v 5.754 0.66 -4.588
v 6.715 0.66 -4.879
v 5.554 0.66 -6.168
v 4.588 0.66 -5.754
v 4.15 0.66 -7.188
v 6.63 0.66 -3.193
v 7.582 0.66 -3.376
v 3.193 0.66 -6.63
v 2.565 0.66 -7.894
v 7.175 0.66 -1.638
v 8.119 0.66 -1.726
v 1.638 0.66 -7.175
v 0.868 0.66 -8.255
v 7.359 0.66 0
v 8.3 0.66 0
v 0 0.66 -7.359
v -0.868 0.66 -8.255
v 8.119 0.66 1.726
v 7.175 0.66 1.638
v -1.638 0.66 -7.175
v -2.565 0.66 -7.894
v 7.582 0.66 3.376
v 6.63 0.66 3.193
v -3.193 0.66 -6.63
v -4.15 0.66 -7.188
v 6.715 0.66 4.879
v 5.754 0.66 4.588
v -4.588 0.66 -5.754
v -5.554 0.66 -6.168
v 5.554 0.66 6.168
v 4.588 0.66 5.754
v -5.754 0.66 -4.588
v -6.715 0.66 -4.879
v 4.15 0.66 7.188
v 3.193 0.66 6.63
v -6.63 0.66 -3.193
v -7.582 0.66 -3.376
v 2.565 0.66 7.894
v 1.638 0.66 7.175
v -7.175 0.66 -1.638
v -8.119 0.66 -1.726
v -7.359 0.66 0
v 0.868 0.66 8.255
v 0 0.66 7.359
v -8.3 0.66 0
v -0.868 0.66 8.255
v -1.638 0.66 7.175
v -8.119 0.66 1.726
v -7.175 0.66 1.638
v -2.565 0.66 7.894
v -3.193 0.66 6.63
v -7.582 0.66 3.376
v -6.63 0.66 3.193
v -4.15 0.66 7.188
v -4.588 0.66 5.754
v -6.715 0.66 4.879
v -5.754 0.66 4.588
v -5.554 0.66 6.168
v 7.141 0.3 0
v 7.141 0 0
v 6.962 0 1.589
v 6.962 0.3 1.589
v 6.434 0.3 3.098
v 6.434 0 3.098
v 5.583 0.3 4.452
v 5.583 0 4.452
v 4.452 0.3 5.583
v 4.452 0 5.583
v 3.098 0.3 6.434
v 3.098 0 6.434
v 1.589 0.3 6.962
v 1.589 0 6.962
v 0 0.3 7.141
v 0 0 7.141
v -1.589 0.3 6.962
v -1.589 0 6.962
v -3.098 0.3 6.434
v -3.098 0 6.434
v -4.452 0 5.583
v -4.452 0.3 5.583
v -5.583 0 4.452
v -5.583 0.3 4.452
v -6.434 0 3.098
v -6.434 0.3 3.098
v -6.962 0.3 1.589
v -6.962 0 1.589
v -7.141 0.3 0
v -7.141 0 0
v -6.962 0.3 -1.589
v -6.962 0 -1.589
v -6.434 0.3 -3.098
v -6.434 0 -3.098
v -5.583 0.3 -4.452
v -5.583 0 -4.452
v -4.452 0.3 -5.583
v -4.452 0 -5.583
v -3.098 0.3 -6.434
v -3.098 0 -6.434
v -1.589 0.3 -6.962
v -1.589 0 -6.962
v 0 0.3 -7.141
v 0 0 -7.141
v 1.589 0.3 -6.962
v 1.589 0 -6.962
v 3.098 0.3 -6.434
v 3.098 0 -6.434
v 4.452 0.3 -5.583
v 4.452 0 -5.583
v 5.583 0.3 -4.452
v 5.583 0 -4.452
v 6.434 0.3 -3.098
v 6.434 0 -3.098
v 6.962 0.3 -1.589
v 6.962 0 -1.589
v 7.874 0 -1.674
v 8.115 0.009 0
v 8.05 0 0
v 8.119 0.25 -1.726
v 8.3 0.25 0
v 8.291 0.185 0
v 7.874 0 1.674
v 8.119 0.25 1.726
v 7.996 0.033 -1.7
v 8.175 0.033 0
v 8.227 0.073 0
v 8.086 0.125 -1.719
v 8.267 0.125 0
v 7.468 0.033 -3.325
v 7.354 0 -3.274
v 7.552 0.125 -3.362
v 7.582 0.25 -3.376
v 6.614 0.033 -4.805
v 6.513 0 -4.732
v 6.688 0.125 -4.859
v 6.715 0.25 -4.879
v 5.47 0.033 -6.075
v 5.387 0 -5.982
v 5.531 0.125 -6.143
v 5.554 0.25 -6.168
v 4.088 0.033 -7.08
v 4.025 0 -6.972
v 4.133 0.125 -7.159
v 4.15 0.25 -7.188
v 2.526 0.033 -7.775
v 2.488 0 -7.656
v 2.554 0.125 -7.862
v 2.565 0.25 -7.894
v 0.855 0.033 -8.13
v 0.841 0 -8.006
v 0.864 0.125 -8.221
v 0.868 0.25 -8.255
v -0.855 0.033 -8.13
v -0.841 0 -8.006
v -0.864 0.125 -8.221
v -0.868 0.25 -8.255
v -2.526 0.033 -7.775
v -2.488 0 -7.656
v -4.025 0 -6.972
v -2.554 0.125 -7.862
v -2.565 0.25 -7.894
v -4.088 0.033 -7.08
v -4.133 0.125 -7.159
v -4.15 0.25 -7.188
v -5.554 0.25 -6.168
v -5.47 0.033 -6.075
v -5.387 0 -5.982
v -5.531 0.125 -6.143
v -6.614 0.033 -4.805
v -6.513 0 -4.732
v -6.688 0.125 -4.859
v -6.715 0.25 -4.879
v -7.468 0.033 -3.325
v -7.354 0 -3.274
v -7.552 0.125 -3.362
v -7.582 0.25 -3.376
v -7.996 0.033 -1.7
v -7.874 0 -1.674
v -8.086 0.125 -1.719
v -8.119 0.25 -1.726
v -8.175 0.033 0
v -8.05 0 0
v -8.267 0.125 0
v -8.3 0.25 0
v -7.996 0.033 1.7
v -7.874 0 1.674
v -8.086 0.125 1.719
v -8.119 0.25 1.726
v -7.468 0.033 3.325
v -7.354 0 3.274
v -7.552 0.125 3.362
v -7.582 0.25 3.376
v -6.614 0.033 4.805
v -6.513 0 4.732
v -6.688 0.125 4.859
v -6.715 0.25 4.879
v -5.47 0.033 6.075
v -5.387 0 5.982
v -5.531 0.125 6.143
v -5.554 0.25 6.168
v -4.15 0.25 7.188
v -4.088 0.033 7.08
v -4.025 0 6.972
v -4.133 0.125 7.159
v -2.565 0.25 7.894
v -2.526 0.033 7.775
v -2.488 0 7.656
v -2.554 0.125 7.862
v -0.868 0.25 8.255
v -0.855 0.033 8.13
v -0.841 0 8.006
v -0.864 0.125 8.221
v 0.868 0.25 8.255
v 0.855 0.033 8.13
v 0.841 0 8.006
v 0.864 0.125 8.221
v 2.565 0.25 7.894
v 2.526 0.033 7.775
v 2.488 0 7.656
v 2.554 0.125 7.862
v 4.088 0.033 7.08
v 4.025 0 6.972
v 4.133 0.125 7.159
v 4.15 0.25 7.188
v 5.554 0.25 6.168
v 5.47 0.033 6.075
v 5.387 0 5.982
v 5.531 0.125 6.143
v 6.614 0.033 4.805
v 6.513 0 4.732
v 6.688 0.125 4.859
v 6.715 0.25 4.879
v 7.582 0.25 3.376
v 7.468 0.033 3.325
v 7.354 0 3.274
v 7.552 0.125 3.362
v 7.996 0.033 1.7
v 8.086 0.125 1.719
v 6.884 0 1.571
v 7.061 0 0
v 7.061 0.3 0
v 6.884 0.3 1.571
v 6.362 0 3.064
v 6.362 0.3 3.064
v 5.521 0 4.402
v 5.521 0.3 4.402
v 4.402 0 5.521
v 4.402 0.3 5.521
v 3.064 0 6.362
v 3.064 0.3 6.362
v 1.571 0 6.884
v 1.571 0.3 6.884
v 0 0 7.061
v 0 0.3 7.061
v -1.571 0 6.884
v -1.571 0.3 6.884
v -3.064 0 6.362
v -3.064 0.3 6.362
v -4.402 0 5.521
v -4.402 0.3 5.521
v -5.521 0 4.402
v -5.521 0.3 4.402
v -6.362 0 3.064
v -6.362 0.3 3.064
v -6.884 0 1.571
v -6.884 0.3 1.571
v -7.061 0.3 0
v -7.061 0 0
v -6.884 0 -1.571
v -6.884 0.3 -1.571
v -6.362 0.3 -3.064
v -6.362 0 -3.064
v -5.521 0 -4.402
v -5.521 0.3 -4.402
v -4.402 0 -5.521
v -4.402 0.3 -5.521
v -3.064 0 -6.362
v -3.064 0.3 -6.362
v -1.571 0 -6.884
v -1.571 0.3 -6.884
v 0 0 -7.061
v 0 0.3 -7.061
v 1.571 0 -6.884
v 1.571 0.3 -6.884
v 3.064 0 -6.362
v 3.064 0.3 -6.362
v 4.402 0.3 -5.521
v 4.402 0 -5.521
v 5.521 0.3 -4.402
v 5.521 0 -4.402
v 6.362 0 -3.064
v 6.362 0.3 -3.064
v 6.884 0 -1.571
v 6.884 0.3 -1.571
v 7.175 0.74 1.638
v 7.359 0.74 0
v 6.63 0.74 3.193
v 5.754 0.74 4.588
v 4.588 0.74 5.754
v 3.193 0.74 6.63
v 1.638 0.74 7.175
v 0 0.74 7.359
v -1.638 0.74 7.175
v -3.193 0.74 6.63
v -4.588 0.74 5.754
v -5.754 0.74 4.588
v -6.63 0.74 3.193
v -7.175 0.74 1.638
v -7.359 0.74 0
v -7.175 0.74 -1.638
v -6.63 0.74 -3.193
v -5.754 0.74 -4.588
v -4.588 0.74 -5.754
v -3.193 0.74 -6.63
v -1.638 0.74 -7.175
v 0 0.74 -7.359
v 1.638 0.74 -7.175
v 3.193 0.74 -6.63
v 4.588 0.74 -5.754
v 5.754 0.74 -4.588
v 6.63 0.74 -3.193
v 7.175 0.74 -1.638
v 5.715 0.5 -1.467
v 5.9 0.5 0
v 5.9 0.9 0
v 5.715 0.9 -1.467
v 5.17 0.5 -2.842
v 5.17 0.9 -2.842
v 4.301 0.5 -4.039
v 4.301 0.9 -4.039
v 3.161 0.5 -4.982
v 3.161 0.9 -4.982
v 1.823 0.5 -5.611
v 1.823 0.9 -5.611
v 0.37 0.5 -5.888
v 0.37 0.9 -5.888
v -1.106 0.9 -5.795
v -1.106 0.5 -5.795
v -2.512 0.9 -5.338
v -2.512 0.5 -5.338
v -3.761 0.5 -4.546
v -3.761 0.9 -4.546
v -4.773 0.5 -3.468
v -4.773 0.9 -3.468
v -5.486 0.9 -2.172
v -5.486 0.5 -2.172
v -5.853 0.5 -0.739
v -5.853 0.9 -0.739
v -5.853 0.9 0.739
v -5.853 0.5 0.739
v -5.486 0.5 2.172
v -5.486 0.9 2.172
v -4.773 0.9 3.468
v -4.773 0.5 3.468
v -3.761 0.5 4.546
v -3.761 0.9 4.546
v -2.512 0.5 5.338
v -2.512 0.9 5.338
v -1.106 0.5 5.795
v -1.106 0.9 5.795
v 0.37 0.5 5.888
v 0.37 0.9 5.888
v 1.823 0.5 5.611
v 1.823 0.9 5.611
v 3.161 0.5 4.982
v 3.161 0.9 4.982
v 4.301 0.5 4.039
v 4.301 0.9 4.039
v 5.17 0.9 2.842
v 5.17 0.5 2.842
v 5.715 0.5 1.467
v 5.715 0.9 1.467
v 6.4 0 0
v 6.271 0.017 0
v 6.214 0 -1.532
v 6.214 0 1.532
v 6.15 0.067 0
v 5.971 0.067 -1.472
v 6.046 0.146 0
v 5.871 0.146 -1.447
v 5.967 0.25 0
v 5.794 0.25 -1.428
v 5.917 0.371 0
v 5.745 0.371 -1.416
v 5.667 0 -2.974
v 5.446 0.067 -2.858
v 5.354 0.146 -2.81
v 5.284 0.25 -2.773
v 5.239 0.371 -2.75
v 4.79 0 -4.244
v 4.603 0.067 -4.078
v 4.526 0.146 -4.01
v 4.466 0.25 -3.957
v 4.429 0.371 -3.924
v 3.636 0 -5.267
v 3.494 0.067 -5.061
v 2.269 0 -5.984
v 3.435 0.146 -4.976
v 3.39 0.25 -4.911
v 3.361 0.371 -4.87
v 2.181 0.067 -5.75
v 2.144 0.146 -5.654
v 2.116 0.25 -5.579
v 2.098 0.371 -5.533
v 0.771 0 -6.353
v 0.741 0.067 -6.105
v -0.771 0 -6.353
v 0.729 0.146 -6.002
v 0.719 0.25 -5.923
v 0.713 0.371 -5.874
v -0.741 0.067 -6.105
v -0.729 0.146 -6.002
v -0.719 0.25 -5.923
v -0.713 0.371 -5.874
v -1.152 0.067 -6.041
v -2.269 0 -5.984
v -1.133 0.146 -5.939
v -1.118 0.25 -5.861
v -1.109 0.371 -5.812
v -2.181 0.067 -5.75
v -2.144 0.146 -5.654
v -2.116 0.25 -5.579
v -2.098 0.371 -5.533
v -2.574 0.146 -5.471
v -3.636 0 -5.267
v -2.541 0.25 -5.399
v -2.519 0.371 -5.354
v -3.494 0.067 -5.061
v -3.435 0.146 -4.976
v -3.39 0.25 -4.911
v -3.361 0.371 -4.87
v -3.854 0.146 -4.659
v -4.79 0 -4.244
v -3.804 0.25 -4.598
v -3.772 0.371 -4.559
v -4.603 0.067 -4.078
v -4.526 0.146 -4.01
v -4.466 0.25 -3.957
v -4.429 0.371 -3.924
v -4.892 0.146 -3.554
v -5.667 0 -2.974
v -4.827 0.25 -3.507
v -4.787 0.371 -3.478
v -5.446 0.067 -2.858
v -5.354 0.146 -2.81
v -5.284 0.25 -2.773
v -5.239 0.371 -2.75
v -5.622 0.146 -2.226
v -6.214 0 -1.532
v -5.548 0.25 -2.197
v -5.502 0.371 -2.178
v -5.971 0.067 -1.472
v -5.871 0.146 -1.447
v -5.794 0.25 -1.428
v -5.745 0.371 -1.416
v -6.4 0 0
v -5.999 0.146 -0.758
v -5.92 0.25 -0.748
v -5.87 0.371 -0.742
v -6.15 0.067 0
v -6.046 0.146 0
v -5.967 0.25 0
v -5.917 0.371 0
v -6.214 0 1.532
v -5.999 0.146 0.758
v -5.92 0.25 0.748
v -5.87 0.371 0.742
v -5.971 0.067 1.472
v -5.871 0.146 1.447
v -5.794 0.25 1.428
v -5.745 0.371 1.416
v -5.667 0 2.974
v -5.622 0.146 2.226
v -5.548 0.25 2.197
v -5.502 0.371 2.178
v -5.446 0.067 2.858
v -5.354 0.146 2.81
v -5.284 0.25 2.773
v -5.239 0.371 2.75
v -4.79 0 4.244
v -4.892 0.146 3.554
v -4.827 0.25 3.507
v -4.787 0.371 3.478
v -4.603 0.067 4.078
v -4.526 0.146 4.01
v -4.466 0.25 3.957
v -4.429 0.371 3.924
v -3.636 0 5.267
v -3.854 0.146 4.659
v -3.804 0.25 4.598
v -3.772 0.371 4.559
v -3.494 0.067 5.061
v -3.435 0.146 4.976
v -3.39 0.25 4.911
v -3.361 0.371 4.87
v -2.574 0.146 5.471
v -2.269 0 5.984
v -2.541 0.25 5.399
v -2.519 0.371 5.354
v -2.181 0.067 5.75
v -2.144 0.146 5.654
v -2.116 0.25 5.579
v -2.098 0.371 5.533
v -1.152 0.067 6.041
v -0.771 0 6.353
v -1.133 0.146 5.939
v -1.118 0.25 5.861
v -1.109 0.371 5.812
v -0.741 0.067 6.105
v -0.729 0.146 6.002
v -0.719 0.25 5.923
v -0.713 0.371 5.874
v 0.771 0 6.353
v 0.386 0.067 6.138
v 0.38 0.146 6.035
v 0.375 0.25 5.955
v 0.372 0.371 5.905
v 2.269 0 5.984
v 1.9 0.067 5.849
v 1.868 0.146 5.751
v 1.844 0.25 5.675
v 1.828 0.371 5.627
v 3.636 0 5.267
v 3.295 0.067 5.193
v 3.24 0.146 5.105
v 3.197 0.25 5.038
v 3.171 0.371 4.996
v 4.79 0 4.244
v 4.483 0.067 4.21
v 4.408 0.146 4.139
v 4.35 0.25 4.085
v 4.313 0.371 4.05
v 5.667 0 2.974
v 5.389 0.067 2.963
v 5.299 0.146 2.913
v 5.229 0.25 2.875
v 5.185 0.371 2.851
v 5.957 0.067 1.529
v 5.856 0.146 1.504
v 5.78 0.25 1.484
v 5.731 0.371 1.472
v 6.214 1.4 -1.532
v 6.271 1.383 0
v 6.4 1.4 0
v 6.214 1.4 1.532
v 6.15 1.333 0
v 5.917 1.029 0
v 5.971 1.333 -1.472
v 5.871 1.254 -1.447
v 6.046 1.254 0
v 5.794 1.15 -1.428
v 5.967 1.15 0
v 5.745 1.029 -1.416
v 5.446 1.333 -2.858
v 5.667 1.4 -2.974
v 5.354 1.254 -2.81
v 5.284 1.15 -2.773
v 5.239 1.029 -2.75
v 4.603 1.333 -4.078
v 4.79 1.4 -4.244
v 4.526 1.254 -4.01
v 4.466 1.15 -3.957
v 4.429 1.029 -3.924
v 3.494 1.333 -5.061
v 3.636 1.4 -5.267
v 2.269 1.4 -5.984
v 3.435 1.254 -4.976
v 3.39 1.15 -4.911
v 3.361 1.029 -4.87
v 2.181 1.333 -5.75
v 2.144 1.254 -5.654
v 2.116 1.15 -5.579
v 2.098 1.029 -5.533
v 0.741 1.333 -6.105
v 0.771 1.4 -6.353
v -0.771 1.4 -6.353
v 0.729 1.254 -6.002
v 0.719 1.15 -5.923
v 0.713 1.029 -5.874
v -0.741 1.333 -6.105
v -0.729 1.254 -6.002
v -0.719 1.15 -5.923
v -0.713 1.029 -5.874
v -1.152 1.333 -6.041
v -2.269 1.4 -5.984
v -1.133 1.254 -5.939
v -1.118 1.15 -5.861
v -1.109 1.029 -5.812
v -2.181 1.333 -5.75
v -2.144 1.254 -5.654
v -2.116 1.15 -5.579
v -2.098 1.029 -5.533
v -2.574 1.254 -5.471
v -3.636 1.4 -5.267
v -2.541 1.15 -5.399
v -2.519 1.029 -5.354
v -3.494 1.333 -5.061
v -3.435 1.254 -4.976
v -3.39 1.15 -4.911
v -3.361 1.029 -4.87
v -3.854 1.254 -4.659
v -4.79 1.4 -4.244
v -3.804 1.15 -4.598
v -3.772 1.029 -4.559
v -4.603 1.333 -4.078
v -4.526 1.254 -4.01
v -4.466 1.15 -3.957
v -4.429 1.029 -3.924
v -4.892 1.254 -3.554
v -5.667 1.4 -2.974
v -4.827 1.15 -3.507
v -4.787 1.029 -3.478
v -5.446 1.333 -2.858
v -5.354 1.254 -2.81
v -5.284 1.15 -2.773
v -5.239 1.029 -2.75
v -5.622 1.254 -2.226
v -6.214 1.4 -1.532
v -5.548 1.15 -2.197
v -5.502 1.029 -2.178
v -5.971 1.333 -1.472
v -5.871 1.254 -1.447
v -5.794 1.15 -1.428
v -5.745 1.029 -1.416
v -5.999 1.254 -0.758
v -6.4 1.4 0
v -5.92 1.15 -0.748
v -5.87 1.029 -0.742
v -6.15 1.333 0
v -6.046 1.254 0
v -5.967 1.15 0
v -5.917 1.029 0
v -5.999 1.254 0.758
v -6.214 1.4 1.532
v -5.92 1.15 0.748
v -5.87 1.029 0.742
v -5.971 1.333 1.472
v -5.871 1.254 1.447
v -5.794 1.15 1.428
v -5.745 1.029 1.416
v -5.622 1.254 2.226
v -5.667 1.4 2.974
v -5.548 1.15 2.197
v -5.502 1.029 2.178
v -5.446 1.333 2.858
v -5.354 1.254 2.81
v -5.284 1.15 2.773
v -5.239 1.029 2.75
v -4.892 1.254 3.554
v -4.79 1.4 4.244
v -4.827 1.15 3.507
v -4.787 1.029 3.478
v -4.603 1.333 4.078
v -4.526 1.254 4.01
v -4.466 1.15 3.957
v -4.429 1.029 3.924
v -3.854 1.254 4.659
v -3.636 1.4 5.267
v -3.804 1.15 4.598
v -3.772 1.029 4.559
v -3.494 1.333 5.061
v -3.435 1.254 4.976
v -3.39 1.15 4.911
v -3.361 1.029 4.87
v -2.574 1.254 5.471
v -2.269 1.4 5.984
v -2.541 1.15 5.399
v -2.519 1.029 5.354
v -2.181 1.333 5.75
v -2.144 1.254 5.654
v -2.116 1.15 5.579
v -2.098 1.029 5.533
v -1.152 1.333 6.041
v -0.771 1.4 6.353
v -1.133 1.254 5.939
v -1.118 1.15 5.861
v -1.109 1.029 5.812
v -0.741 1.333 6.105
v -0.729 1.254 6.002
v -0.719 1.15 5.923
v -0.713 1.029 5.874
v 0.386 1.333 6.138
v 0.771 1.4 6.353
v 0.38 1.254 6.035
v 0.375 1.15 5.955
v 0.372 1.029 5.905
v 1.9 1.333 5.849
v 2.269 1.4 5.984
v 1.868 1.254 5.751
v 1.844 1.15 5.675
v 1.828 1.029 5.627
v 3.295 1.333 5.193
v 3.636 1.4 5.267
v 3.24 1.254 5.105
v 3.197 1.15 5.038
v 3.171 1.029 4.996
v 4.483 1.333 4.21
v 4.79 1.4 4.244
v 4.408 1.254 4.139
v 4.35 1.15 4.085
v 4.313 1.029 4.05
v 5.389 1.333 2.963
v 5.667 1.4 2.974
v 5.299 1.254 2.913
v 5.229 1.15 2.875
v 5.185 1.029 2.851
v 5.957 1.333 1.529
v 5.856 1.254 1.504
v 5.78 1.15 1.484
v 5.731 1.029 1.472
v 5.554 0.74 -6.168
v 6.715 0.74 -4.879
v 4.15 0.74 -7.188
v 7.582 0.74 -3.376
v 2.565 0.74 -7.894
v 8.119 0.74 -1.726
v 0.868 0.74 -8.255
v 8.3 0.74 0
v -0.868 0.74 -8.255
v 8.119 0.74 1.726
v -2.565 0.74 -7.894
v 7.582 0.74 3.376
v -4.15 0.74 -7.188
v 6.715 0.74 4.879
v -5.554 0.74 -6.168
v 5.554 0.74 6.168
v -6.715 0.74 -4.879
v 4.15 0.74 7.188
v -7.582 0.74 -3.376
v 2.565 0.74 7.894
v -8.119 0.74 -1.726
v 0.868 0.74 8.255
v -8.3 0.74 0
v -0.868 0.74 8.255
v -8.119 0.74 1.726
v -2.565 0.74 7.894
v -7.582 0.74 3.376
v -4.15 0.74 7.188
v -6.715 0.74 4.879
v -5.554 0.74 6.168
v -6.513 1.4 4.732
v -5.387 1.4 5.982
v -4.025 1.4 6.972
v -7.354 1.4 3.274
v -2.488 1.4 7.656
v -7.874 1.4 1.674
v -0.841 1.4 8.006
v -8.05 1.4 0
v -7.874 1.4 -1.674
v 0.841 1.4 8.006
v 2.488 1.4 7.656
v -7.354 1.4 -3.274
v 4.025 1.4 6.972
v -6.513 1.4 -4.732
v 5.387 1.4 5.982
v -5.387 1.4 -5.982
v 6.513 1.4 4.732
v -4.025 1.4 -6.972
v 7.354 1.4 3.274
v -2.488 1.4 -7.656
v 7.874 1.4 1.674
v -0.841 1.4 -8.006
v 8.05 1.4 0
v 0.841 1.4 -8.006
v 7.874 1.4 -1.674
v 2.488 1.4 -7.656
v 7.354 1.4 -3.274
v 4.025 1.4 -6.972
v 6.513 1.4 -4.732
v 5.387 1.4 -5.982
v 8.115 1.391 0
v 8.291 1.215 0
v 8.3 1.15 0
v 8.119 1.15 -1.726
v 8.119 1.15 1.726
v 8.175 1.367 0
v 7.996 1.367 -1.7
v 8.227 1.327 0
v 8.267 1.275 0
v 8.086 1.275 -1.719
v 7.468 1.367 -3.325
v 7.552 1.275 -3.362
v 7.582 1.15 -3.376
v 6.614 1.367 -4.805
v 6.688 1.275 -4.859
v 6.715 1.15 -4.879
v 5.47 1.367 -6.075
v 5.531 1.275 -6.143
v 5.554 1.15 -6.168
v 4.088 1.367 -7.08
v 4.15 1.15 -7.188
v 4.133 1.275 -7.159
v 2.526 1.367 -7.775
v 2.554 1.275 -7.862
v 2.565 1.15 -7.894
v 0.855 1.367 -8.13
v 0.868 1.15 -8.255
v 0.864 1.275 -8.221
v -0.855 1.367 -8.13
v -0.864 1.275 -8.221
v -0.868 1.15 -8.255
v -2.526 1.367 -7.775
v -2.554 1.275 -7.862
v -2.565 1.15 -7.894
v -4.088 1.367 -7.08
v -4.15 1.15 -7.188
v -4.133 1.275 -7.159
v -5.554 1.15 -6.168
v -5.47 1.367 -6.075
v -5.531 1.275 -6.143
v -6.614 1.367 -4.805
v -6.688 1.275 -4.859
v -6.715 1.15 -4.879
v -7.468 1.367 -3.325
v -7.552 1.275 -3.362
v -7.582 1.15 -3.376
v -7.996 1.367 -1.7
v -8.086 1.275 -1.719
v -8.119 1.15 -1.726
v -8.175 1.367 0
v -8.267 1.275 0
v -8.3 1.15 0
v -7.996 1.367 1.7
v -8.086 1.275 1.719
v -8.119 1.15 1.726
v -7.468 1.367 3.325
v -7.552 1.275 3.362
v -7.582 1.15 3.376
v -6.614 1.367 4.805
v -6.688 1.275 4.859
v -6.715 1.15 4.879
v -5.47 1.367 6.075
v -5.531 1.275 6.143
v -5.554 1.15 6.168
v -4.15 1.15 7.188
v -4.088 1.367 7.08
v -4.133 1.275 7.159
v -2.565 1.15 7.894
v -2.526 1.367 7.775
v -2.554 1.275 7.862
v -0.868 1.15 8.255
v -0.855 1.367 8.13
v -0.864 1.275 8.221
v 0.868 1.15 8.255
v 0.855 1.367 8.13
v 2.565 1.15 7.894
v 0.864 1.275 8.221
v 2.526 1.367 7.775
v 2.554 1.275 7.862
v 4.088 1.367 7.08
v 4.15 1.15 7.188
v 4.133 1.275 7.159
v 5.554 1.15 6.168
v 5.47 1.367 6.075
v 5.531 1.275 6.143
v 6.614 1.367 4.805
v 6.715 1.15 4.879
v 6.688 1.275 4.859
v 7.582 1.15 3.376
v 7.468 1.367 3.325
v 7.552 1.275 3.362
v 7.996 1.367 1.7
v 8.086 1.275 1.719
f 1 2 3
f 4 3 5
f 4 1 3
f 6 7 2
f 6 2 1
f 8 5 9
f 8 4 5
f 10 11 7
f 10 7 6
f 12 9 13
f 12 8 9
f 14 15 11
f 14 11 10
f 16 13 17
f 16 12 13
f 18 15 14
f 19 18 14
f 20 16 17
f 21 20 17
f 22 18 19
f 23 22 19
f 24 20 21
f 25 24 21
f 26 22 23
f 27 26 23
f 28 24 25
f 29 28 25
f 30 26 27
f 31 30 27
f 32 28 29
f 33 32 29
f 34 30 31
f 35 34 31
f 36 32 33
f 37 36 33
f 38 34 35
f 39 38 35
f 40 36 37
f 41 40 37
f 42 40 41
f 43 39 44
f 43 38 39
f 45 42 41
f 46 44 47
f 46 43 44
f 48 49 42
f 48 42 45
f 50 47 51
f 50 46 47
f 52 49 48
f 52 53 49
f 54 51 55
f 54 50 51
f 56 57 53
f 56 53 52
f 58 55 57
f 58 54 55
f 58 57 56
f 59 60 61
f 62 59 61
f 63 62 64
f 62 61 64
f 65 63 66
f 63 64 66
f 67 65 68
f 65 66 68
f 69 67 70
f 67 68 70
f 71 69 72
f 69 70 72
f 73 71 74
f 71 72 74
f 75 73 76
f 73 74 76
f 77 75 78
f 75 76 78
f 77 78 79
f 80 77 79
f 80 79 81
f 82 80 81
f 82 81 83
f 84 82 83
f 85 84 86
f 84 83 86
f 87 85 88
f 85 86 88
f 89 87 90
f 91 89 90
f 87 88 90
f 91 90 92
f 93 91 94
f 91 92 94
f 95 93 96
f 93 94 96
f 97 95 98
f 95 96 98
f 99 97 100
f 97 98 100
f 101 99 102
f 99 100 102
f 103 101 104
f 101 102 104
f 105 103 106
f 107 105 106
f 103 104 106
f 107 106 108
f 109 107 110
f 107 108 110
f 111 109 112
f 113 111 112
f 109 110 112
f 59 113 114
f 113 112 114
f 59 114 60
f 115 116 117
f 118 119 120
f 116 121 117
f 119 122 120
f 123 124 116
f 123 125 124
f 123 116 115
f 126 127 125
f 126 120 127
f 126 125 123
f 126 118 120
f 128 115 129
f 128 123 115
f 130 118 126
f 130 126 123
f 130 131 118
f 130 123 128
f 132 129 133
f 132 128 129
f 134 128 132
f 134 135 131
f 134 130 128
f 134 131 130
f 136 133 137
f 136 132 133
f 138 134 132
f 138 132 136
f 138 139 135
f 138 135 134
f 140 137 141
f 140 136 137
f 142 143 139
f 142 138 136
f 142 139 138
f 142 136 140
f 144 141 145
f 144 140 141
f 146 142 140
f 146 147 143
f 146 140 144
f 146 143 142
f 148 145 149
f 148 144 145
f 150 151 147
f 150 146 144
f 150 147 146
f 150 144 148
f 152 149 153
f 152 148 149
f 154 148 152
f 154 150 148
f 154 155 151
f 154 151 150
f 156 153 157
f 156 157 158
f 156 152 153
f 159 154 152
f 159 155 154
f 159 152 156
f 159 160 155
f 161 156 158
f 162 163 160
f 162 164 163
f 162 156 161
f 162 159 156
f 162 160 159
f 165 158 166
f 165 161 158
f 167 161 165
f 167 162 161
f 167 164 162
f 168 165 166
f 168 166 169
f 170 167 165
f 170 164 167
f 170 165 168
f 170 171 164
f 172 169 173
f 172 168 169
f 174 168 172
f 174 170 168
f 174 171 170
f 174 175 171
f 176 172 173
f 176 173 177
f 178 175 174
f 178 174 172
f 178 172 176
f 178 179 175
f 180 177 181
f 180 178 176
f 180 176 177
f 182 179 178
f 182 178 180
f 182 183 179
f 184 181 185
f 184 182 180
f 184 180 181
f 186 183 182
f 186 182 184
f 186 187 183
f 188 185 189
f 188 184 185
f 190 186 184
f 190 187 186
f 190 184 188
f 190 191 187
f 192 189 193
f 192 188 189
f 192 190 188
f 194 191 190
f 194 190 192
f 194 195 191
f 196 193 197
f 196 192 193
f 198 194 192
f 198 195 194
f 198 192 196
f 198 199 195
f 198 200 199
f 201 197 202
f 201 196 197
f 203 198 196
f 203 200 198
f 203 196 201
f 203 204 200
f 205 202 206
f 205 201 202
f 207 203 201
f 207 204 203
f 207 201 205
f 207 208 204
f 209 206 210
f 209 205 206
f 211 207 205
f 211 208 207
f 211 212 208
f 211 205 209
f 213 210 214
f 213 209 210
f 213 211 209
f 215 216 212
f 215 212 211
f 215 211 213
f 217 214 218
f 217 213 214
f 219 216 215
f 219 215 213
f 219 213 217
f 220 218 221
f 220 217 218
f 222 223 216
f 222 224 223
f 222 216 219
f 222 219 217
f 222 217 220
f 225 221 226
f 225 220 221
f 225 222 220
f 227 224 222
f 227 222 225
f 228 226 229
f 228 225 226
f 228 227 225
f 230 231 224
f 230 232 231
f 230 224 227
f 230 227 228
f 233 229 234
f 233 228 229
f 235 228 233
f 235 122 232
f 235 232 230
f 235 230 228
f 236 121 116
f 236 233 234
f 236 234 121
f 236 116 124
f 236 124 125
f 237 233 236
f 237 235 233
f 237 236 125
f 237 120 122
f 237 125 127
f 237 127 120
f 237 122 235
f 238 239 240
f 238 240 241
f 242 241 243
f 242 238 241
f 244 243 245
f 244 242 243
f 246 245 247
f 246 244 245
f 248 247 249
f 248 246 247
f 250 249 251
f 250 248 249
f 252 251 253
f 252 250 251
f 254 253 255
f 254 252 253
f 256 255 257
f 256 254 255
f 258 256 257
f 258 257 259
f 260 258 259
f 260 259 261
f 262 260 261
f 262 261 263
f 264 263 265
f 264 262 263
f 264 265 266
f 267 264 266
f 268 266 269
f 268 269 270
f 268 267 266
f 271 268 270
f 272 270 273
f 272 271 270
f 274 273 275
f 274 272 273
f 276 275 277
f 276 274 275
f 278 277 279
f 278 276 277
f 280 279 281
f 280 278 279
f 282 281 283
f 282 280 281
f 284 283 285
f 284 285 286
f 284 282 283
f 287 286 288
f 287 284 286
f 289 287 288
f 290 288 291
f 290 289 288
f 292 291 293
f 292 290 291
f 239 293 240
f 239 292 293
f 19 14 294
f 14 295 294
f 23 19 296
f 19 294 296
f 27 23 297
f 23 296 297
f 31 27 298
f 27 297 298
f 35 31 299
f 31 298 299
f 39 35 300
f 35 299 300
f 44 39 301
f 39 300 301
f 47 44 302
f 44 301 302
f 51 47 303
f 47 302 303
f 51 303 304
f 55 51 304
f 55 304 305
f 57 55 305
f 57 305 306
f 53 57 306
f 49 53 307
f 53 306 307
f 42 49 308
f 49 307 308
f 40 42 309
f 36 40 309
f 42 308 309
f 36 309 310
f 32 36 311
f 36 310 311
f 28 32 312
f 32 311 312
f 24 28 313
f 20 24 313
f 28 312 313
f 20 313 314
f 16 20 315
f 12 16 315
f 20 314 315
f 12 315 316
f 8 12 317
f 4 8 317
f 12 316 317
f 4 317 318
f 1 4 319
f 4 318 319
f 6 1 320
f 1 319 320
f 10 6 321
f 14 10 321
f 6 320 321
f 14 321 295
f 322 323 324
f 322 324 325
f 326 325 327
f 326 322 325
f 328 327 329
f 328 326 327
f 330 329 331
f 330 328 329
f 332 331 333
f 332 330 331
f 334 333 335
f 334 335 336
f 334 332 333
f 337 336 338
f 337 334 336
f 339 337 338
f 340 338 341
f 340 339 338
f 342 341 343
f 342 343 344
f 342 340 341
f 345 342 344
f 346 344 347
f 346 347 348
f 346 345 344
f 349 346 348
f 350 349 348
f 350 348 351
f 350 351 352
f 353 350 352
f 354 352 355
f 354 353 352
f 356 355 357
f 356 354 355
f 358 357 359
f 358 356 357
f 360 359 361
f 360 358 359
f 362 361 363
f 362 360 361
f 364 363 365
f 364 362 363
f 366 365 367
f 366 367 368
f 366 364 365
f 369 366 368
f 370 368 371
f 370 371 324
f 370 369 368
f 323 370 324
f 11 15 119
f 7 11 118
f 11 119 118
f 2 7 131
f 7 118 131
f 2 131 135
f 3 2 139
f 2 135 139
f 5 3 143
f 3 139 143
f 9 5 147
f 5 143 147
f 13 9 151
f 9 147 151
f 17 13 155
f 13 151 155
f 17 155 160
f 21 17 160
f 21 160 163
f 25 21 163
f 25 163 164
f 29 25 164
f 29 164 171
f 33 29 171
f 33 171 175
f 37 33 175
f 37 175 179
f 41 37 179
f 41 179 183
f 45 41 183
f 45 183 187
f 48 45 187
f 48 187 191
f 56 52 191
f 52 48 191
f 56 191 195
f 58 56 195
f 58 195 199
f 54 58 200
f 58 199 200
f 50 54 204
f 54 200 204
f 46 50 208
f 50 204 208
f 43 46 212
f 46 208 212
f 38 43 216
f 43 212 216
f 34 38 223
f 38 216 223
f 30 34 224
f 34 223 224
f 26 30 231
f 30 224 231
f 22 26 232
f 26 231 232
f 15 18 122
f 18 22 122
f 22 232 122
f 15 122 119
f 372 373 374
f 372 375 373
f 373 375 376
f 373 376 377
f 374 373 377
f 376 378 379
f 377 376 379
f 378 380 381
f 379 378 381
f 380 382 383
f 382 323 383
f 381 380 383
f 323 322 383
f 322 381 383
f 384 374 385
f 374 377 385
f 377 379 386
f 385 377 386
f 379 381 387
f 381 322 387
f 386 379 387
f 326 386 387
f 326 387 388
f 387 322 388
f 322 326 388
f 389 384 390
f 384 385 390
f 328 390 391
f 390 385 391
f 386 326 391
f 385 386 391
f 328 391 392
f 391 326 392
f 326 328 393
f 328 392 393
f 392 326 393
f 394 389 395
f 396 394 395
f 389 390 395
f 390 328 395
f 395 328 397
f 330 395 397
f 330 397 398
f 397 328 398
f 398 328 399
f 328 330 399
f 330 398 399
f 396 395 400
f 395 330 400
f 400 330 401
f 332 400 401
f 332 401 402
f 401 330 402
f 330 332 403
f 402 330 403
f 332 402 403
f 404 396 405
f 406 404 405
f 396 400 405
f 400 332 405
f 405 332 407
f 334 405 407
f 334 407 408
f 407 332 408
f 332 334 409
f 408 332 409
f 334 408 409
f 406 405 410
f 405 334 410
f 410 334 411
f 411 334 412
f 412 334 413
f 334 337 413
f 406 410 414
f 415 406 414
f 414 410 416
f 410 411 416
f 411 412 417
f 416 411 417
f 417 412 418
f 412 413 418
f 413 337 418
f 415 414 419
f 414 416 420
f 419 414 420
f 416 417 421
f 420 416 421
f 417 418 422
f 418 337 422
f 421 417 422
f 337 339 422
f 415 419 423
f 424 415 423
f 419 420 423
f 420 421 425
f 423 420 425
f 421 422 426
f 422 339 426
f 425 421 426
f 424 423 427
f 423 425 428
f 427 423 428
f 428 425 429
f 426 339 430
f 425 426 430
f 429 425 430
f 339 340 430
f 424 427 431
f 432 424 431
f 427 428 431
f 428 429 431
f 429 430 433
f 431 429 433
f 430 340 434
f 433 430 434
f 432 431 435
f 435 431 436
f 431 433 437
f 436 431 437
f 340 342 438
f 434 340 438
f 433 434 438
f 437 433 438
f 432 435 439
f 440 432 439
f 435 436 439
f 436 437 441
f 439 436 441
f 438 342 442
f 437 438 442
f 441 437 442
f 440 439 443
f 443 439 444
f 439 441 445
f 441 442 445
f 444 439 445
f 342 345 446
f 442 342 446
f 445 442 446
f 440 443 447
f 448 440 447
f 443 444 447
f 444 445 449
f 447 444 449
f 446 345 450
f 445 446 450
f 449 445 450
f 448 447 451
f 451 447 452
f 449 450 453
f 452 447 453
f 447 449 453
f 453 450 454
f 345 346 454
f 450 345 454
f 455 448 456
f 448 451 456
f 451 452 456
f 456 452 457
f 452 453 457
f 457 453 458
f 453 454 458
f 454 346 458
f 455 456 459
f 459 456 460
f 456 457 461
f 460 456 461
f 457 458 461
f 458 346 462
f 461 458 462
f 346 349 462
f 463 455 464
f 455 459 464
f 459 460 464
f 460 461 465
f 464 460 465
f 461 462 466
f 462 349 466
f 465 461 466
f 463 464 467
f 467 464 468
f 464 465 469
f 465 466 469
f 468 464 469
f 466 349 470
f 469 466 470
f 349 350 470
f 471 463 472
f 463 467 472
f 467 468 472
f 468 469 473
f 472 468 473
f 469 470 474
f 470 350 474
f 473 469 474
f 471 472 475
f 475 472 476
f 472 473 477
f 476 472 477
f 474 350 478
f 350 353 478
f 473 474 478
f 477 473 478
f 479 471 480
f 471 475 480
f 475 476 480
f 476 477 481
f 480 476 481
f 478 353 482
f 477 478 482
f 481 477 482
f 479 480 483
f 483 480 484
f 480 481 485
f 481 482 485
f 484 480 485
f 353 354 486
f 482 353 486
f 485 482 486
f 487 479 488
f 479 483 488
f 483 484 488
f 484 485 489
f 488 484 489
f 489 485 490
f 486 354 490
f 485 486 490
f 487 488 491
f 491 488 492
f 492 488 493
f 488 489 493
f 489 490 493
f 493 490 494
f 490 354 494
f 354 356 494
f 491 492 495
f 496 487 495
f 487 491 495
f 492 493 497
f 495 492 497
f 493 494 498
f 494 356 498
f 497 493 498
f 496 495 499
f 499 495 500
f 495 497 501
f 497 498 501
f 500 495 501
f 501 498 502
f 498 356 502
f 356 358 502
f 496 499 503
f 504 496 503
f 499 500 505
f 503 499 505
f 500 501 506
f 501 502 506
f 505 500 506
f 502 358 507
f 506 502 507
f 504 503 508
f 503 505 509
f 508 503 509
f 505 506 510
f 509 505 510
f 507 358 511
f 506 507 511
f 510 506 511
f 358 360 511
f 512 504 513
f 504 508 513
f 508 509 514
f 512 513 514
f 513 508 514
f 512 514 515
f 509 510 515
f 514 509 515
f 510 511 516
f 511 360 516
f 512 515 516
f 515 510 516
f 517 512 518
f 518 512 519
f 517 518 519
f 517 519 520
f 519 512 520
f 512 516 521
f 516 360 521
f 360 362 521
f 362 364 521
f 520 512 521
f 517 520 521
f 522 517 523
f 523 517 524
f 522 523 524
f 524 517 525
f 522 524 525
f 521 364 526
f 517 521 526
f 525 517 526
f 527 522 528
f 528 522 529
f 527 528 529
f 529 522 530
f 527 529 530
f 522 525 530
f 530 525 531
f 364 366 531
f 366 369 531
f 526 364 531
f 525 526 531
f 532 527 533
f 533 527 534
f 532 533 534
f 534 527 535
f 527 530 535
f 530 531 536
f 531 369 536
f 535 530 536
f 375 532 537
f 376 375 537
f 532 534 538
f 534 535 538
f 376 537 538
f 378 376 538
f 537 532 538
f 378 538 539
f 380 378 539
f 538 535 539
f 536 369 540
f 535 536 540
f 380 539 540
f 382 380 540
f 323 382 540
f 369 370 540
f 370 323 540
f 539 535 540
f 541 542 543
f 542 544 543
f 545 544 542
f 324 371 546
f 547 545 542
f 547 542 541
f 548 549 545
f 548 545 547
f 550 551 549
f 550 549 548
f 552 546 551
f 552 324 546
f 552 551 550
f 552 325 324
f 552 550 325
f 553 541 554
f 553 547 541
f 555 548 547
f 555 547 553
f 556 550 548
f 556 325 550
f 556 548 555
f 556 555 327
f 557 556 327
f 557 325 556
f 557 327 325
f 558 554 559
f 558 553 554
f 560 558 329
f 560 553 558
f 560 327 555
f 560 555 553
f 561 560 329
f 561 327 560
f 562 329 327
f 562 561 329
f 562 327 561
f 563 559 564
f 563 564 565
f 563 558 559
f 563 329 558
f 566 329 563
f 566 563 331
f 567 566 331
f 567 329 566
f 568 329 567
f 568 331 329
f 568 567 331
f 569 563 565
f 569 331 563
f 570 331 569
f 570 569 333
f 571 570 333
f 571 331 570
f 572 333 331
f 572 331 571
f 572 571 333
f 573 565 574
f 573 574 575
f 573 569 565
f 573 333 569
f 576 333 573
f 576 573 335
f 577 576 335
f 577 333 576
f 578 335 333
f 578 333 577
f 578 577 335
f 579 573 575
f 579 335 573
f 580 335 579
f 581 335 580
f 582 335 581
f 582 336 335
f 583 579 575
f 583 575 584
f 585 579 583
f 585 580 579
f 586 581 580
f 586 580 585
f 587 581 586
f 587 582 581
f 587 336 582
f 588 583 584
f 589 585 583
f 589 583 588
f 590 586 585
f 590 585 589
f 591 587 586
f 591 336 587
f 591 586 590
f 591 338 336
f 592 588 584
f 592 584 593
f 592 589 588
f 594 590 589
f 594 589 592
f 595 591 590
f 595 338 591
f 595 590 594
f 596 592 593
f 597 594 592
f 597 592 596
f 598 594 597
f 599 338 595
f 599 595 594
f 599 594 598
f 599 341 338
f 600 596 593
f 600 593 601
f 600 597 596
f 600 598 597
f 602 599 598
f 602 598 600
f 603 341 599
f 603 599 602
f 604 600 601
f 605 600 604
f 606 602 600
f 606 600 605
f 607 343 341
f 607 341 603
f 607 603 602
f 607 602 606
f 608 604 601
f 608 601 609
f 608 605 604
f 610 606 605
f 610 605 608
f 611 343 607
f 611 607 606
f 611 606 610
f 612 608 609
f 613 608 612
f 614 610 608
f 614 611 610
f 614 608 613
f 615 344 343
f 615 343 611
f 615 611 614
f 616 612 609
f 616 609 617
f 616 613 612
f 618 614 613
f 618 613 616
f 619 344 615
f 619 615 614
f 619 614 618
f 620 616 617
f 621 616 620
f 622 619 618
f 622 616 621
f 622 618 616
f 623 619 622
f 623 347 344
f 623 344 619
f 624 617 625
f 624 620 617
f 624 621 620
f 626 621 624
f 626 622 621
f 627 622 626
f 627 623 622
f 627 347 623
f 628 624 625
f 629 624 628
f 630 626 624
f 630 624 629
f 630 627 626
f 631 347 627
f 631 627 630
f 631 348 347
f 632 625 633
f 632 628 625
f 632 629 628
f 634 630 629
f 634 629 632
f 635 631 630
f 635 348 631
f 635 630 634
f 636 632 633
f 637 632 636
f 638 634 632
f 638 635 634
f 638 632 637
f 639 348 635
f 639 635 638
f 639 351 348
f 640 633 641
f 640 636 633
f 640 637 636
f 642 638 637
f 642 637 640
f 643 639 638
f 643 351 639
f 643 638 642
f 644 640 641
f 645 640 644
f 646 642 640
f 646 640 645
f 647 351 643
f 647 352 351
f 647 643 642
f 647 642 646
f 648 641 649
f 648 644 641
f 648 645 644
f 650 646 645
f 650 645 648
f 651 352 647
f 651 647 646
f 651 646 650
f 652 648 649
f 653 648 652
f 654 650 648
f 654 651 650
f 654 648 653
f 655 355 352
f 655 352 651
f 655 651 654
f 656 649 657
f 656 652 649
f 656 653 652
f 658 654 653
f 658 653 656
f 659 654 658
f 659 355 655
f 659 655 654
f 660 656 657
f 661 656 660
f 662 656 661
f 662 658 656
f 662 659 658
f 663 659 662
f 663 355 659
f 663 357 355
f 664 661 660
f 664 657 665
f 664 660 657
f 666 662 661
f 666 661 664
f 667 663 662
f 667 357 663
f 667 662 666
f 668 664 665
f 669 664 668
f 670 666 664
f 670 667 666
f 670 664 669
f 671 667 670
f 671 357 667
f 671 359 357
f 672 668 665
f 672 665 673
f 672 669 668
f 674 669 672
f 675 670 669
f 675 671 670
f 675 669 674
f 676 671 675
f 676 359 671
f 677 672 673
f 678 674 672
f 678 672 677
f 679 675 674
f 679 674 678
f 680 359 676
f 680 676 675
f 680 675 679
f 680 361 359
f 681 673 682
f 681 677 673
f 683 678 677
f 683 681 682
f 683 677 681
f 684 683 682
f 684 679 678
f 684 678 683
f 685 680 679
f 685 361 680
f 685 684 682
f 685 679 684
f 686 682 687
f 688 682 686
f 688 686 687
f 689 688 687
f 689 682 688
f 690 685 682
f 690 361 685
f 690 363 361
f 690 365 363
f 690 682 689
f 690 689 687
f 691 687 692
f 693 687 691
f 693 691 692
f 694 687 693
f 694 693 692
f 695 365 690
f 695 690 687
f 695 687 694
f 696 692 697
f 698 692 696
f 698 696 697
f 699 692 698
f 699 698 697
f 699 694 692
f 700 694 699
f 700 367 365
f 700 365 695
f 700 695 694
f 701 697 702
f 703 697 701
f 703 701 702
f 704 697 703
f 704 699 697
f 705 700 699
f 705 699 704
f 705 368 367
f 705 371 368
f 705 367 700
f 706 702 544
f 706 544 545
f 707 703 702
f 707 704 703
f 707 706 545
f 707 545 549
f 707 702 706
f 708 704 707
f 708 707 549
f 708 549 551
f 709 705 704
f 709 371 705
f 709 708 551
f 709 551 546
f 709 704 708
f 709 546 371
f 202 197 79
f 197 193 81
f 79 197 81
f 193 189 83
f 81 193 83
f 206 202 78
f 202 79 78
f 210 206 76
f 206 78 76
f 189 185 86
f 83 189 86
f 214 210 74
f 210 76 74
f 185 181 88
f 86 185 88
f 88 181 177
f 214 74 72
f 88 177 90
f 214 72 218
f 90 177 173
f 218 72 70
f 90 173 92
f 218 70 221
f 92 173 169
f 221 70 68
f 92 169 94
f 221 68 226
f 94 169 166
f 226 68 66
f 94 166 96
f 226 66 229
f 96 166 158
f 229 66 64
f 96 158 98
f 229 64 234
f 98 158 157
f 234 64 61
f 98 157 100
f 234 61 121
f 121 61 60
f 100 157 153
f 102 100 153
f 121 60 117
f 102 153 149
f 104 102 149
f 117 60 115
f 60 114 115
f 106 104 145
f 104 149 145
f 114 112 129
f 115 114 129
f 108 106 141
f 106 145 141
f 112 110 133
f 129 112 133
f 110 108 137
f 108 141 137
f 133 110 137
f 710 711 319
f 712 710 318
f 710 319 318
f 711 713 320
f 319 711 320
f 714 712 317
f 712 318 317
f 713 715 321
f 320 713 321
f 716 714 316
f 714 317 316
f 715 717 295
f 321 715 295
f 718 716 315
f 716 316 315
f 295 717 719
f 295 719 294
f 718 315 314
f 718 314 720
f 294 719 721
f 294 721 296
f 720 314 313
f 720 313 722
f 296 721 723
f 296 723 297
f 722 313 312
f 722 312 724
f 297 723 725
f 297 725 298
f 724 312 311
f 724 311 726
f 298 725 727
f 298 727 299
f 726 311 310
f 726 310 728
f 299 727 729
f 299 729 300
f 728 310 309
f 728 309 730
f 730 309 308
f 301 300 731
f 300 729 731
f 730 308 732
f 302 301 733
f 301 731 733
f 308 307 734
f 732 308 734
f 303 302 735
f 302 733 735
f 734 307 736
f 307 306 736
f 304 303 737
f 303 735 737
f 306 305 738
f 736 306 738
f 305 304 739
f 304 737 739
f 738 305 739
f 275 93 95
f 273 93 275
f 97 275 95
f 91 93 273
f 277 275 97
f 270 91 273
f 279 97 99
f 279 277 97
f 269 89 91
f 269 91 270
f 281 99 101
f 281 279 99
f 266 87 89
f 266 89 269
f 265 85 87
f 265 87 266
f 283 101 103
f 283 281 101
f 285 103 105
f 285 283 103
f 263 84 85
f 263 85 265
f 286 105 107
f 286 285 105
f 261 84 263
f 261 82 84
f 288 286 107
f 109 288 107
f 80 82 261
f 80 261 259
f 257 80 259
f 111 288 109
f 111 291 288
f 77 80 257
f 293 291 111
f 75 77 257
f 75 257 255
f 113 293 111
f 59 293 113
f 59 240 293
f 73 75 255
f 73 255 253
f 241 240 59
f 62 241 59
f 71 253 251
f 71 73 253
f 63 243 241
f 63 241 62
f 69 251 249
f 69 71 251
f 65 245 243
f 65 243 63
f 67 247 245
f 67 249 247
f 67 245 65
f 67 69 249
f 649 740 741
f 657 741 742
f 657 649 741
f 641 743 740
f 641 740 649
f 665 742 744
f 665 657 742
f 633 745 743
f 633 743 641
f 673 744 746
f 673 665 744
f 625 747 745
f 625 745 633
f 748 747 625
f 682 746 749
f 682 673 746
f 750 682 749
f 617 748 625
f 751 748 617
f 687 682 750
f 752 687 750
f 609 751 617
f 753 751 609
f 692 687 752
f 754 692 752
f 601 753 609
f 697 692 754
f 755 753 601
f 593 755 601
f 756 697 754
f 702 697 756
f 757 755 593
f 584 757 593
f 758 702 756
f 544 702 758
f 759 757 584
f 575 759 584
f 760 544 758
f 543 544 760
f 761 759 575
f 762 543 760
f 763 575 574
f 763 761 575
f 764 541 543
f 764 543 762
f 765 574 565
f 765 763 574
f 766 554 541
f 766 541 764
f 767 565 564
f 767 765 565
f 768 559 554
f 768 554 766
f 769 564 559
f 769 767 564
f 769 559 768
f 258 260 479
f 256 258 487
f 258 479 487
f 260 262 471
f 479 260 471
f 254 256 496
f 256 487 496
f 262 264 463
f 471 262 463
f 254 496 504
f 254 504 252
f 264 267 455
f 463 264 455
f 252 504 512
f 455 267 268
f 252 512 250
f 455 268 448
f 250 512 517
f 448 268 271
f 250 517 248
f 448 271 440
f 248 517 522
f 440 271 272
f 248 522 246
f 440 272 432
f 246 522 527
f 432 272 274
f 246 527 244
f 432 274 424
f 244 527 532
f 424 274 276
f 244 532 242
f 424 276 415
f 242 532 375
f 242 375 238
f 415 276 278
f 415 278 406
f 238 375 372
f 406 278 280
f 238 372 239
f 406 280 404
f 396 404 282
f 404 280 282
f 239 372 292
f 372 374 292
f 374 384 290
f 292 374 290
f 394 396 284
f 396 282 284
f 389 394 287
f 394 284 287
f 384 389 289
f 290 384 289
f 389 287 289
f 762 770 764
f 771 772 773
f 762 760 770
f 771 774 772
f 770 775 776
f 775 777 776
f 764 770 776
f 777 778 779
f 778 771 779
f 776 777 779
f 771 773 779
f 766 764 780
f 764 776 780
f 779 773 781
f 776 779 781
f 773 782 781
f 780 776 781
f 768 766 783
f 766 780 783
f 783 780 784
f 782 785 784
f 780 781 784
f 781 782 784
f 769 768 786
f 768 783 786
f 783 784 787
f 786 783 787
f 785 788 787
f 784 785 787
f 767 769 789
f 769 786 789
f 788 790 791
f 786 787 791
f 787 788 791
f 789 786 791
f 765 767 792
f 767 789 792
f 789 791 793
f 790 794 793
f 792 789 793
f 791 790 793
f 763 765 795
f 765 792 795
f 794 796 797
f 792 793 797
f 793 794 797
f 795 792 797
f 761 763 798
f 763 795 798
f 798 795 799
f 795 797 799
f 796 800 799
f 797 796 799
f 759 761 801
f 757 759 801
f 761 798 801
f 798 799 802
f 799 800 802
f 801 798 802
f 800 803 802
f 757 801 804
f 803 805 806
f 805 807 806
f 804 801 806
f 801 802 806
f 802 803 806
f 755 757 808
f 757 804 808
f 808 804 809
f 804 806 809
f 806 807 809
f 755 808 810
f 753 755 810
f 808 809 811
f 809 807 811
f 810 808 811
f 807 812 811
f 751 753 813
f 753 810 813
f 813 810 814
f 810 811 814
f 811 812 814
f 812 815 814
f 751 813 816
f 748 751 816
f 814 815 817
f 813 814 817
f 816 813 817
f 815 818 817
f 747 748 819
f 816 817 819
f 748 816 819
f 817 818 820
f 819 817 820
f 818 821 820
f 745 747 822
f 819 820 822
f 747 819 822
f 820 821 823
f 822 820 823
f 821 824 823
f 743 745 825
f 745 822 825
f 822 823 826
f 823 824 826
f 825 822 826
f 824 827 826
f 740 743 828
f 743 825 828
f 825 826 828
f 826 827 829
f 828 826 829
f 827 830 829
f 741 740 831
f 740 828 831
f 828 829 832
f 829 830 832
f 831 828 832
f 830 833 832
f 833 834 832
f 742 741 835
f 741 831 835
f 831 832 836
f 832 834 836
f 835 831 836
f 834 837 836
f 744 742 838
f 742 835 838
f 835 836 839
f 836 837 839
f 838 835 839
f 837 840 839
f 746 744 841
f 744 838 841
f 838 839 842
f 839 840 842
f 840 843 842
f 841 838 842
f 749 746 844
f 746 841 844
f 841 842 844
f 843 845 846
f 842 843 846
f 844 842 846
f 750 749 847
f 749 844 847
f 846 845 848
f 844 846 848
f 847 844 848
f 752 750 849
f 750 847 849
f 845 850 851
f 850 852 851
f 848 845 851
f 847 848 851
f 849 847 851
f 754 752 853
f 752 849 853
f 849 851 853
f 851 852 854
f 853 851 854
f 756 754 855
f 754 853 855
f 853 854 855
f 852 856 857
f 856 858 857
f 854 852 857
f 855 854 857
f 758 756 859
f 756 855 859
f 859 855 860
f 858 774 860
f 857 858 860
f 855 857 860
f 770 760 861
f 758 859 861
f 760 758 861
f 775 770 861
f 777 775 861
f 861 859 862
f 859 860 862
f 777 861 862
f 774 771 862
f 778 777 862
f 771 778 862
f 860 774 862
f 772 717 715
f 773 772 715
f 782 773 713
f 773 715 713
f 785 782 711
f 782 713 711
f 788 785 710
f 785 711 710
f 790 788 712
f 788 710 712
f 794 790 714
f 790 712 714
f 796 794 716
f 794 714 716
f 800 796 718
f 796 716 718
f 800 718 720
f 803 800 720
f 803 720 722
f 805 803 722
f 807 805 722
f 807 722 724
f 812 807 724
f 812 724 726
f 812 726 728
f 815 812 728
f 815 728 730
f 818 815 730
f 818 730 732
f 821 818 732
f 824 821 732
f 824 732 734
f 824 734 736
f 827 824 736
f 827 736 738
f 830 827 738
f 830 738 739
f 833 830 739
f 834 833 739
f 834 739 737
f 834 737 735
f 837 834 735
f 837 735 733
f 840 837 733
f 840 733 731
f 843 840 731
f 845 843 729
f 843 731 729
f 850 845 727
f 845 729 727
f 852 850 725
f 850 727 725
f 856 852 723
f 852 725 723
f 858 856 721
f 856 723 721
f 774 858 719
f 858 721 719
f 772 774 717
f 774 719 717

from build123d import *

# Parameters (mm, degrees)
SKETCH1_R           = 8.3
SKETCH1_R_2         = 5.9
BOSS_EXTRUDE1_DEPTH = 1.4
SKETCH2_W           = 1.295074367
SKETCH2_H           = 0.08
SKETCH3_R           = 7.141016866
SKETCH3_R_2         = 7.061016866
CUT_EXTRUDE1_DEPTH  = 0.3
FILLET1_R           = 0.5
FILLET2_R           = 0.25


with BuildPart() as part:
    # Sketch1 → Boss-Extrude1 (new body)
    with BuildSketch(Plane(origin=(0, 0, 0), x_dir=(1, 0, 0), z_dir=(0, 1, 0))):
        Circle(SKETCH1_R)
        Circle(SKETCH1_R_2, mode=Mode.SUBTRACT)
    extrude(amount=BOSS_EXTRUDE1_DEPTH)

    # Sketch2 → Cut-Revolve1 (revolve, cut)
    with BuildSketch(Plane.XY):
        with Locations((8.00669044, 0.7)):
            Rectangle(SKETCH2_W, SKETCH2_H)
    revolve(axis=Axis((0, 1.4, 0), (0, -1, 0)), mode=Mode.SUBTRACT)

    # Sketch3 → Cut-Extrude1 (cut)
    with BuildSketch(Plane.XZ):
        Circle(SKETCH3_R)
        Circle(SKETCH3_R_2, mode=Mode.SUBTRACT)
    extrude(amount=-CUT_EXTRUDE1_DEPTH, mode=Mode.SUBTRACT)

    # Fillet1
    fillet1_edges = [part.edges().sort_by_distance(p)[0] for p in [
        (-5.9, 0, 0),
        (-5.9, 1.4, 0),
    ]]
    fillet(fillet1_edges, radius=FILLET1_R)

    # Fillet2
    fillet2_edges = [part.edges().sort_by_distance(p)[0] for p in [
        (-8.3, 0, 0),
        (-8.3, 1.4, 0),
    ]]
    fillet(fillet2_edges, radius=FILLET2_R)


solid = part.part
